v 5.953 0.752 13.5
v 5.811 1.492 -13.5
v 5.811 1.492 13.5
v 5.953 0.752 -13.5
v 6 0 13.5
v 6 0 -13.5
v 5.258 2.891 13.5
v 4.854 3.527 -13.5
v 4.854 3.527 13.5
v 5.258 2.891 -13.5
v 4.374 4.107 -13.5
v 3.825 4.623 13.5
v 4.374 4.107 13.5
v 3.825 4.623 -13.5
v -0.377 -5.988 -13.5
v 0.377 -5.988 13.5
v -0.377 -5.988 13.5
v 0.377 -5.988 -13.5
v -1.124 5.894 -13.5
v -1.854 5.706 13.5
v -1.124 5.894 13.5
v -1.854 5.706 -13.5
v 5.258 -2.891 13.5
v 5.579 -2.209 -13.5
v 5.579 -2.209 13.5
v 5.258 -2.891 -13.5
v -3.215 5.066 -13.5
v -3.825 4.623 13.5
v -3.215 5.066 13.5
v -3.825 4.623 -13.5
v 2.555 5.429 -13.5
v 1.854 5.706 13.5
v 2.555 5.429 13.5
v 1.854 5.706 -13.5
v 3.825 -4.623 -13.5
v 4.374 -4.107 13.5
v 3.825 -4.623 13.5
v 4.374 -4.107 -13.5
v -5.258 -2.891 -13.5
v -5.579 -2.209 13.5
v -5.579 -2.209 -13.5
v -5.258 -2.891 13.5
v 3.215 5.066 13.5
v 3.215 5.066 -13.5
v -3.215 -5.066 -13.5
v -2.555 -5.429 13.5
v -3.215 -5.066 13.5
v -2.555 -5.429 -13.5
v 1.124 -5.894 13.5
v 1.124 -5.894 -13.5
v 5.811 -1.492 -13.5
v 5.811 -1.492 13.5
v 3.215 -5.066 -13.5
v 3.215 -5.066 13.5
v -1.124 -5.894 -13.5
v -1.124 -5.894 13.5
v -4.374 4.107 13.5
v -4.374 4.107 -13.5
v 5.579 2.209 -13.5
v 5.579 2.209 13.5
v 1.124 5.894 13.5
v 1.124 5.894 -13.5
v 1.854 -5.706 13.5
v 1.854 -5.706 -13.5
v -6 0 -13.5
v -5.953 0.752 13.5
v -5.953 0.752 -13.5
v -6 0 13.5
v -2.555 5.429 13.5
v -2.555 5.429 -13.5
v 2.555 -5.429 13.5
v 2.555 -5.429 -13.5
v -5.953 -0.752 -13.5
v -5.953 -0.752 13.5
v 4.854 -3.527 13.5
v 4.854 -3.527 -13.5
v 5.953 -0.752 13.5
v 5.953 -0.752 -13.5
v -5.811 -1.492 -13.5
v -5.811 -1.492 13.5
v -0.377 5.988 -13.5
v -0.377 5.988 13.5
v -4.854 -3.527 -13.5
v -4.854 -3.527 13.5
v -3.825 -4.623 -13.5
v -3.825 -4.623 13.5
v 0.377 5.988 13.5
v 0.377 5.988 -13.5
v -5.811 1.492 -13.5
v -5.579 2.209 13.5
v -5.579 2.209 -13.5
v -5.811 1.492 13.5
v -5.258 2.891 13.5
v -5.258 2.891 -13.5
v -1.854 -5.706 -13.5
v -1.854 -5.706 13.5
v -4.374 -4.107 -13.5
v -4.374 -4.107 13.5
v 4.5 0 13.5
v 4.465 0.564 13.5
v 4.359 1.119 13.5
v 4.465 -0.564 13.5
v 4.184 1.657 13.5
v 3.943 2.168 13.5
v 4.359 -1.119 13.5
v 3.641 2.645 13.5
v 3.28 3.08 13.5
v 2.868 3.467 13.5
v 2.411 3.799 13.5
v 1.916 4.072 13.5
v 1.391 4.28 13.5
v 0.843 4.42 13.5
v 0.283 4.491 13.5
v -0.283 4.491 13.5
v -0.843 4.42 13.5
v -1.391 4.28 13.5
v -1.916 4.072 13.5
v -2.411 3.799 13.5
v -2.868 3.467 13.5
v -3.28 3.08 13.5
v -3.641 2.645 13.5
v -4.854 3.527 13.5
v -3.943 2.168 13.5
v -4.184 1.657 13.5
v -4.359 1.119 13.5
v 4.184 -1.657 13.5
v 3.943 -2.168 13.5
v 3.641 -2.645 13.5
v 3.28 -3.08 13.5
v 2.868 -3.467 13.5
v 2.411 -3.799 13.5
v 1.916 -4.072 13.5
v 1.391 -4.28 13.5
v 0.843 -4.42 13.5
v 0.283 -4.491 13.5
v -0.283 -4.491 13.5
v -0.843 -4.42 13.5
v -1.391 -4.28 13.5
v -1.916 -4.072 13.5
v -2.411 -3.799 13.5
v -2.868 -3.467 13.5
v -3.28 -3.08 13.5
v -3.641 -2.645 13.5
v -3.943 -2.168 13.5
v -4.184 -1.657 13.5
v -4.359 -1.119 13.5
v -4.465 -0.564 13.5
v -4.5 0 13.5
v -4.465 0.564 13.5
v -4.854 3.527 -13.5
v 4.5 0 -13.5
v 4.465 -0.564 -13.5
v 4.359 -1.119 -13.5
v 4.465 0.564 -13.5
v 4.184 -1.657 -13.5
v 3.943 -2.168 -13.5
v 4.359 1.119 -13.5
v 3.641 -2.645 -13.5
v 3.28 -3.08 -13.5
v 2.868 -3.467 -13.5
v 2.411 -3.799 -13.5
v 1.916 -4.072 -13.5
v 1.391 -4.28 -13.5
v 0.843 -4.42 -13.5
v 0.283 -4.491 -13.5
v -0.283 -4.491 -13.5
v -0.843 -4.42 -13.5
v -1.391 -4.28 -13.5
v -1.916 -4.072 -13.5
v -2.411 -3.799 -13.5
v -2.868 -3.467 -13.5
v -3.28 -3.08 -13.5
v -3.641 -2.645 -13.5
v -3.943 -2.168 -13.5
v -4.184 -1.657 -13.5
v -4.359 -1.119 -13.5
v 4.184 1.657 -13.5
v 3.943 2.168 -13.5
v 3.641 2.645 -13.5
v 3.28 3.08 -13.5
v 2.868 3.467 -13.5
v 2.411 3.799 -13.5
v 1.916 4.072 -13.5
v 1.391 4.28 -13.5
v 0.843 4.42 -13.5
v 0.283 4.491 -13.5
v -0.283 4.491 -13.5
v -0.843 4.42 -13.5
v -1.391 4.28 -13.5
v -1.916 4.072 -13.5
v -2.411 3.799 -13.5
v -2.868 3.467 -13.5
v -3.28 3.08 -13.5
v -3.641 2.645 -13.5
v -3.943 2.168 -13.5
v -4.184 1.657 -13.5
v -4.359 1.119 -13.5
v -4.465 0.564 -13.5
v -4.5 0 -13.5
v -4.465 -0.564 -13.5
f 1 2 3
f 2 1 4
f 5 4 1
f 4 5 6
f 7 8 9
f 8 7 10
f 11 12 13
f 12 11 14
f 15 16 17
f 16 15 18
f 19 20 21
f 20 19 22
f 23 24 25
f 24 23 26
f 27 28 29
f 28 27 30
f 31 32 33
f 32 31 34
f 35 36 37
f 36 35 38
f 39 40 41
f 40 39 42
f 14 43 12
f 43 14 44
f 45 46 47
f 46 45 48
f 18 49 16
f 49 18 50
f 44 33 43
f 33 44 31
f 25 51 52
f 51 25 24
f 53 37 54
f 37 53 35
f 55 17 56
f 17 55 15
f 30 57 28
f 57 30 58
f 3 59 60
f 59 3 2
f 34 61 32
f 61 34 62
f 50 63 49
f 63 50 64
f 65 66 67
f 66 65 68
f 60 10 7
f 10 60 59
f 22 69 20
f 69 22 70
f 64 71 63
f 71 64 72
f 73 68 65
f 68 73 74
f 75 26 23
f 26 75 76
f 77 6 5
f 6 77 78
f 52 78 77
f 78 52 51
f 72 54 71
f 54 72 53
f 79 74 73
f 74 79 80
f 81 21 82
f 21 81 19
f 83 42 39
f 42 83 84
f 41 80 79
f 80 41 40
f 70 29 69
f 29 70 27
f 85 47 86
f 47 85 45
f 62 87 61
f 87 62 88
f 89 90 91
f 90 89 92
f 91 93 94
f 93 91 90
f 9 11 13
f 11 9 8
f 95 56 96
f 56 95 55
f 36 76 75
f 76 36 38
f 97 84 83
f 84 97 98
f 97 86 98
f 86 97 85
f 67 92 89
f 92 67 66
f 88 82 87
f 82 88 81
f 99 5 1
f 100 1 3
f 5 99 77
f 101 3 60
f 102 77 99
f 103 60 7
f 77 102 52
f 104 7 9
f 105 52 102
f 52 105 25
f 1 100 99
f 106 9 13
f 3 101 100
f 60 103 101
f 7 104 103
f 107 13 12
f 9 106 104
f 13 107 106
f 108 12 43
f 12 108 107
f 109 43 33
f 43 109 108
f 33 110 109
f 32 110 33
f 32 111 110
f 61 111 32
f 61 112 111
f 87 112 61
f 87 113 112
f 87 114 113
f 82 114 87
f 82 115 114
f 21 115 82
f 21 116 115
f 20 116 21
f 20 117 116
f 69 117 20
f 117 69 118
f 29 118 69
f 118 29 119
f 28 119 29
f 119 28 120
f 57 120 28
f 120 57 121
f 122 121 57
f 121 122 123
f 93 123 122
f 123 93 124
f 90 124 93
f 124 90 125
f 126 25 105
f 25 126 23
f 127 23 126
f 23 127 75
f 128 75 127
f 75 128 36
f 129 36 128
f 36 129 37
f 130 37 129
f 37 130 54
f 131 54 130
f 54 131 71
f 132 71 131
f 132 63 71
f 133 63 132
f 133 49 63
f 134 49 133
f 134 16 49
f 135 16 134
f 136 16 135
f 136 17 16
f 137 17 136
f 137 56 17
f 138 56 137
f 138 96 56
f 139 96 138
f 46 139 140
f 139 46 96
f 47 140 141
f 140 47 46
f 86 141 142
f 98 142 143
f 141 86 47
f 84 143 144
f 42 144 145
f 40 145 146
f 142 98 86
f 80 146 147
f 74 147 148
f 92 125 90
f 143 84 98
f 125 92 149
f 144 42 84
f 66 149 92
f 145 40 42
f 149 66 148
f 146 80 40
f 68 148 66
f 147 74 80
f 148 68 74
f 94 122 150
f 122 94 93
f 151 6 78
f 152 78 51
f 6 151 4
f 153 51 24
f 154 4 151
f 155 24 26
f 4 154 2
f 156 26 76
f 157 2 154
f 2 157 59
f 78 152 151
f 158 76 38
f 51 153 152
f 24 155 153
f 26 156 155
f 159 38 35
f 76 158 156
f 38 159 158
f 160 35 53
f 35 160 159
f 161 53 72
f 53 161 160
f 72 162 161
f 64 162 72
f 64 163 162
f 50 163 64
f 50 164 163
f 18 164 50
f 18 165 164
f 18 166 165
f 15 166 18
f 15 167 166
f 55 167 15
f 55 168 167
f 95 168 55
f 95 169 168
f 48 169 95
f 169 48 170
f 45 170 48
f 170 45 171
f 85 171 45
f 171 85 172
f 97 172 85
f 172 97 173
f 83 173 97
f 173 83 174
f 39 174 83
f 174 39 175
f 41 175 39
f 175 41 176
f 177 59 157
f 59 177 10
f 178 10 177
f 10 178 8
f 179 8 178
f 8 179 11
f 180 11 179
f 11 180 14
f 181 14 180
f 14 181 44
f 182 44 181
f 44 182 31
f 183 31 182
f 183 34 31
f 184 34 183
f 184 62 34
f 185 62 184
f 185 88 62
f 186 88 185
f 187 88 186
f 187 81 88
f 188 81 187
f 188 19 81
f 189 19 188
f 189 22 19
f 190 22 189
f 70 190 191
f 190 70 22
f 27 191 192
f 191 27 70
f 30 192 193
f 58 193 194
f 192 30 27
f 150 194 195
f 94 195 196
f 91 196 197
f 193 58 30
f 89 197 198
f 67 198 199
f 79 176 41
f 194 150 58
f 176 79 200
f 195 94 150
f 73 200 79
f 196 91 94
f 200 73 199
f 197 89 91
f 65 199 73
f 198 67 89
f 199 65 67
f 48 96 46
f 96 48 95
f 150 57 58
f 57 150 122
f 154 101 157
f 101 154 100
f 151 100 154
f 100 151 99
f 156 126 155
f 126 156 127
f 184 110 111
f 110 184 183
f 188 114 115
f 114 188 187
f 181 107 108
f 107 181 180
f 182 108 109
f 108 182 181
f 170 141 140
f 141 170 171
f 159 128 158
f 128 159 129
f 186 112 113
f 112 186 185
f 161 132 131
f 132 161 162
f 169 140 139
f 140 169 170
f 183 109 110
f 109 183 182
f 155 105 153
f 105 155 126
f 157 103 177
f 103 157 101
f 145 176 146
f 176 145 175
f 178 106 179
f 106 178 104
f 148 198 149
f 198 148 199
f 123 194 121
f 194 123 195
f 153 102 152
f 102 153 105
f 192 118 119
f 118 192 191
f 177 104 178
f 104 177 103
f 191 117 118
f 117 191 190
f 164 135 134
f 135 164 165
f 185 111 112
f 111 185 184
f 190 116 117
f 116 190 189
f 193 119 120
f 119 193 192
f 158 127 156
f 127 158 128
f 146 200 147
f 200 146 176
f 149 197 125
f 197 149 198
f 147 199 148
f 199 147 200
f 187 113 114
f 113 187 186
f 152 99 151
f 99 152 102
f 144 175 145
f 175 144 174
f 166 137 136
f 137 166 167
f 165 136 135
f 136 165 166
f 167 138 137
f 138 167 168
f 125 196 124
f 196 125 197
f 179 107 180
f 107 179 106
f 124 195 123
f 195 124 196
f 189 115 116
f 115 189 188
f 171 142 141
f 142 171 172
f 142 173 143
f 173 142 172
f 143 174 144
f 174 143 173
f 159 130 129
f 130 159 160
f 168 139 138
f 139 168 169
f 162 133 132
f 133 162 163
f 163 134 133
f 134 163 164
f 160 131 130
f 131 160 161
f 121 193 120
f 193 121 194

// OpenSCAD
$fn = 50;


difference() {
	union() {
		translate(v = [0, 0, -13.5000000000]) {
			cylinder(h = 27, r = 6.0000000000);
		}
	}
	union() {
		translate(v = [0, 0, -100.0000000000]) {
			cylinder(h = 200, r = 4.5000000000);
		}
	}
}
